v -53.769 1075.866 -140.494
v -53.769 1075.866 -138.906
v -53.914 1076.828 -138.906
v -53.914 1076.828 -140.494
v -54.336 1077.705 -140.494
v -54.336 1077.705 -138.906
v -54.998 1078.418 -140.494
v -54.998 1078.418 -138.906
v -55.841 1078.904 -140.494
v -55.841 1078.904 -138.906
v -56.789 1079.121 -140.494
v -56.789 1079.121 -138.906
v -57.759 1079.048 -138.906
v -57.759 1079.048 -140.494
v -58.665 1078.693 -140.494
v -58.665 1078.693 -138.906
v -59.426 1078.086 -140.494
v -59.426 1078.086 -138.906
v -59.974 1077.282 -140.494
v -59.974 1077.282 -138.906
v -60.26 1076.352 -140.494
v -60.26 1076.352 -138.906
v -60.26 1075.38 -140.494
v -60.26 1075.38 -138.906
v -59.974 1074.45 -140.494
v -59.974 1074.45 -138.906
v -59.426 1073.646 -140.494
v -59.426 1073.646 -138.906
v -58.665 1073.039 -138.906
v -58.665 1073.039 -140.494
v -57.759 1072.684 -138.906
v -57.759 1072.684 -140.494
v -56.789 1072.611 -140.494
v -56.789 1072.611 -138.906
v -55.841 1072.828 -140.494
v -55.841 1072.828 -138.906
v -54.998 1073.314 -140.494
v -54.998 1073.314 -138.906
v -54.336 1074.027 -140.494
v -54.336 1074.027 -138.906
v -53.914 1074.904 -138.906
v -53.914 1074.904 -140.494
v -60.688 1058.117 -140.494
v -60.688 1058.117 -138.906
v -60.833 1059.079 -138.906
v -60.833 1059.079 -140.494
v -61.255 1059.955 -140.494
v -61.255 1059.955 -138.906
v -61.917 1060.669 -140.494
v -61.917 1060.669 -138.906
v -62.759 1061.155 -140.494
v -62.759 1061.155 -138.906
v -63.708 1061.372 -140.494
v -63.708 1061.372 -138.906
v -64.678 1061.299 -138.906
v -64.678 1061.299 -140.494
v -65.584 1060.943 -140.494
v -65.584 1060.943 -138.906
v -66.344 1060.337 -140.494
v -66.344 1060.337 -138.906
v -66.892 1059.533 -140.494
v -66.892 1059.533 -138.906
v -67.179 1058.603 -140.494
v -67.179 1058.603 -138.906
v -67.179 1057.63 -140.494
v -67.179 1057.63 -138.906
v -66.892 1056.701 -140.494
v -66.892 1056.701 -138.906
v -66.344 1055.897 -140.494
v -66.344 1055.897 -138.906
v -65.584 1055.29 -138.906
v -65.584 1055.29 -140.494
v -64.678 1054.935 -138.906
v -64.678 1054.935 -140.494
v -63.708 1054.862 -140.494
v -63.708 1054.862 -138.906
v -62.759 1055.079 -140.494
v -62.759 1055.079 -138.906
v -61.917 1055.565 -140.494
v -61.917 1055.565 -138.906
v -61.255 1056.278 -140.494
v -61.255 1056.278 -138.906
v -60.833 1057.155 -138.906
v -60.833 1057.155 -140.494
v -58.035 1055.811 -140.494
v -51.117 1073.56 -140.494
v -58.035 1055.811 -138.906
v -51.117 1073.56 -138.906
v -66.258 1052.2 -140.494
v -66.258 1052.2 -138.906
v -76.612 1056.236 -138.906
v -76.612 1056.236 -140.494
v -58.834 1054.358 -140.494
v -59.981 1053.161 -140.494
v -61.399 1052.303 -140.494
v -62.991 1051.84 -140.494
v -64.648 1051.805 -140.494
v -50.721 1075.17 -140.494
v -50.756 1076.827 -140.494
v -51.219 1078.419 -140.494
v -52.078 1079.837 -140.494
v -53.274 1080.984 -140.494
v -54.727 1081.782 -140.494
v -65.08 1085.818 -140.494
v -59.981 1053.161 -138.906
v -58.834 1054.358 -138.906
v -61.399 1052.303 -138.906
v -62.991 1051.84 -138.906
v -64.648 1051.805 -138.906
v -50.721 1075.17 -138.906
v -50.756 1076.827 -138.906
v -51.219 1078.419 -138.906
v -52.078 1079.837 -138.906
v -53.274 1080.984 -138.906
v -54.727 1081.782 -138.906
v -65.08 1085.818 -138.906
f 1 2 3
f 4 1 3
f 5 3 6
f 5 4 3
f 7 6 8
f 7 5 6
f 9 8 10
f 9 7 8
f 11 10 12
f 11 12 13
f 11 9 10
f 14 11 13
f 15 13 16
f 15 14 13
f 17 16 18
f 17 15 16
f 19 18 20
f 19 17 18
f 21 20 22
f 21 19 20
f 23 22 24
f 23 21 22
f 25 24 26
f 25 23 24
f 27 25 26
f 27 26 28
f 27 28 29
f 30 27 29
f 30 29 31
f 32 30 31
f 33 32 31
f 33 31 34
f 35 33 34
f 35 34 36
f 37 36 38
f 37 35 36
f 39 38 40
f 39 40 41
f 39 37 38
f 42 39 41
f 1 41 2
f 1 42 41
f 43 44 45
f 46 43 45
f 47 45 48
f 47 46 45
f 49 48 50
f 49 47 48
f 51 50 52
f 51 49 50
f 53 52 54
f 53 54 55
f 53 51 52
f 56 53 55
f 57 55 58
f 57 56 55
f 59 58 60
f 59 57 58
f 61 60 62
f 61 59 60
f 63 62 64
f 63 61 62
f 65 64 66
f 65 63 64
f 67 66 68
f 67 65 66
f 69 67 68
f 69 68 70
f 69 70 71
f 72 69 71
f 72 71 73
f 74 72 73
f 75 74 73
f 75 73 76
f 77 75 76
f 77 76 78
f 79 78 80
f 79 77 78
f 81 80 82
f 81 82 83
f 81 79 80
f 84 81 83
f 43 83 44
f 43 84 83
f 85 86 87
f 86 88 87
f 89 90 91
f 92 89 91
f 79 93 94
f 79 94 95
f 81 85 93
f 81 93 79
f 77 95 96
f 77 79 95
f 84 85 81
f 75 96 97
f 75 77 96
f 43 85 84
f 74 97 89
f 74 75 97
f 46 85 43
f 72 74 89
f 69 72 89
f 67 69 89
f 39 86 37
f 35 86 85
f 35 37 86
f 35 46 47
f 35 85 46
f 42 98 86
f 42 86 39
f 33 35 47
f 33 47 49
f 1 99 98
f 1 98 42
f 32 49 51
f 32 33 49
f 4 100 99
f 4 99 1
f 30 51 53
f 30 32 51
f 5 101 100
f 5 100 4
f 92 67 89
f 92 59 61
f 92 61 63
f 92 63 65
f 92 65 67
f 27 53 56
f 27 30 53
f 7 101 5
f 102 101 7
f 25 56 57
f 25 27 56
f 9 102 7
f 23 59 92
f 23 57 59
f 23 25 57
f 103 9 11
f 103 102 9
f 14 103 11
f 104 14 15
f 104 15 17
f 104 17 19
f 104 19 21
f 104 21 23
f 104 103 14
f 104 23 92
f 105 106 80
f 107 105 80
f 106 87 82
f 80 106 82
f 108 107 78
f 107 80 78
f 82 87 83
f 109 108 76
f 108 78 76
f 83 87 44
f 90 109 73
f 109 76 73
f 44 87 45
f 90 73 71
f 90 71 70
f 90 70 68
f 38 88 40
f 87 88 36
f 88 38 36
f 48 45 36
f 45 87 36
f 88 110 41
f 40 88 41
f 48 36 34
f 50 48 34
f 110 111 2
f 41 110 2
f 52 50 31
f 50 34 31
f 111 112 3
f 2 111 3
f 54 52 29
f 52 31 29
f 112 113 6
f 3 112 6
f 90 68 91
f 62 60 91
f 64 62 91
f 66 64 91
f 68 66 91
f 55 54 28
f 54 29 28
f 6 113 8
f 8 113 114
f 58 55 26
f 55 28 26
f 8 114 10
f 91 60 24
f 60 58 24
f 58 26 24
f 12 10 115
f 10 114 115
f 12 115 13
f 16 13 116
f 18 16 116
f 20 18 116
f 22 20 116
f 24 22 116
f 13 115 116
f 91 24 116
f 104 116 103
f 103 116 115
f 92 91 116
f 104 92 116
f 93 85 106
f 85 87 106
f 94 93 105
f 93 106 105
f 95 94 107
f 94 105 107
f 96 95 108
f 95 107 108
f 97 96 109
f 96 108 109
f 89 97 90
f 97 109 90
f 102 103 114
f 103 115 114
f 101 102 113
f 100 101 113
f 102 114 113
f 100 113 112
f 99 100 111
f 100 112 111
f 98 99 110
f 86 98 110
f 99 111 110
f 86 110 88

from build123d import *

# Parameters (mm, degrees)
SKETCH58_R          = 3.2639
BOSS_EXTRUDE1_DEPTH = 0.79375


with BuildPart() as part:
    # Sketch58 → Boss-Extrude1 (new, symmetric)
    with BuildSketch(Plane.XY.offset(-139.7)):
        with BuildLine():
            Line((-65.080499238, 1085.818309343), (-54.72678345, 1081.782441948))
            ThreePointArc((-54.72678345, 1081.782441948), (-51.218723763, 1078.418829178), (-51.116584369, 1073.559822986))
            Line((-51.116584369, 1073.559822986), (-58.03521419, 1055.810595921))
            ThreePointArc((-58.03521419, 1055.810595921), (-61.398826959, 1052.302536234), (-66.257833152, 1052.20039684))
            Line((-66.257833152, 1052.20039684), (-76.611548939, 1056.236264235))
            Line((-76.611548939, 1056.236264235), (-65.080499238, 1085.818309343))
        make_face()
        with Locations((-57.03299339, 1075.866032926)):
            Circle(SKETCH58_R, mode=Mode.SUBTRACT)
        with Locations((-63.951623211, 1058.116805861)):
            Circle(SKETCH58_R, mode=Mode.SUBTRACT)
    extrude(amount=BOSS_EXTRUDE1_DEPTH, both=True)


solid = part.part
